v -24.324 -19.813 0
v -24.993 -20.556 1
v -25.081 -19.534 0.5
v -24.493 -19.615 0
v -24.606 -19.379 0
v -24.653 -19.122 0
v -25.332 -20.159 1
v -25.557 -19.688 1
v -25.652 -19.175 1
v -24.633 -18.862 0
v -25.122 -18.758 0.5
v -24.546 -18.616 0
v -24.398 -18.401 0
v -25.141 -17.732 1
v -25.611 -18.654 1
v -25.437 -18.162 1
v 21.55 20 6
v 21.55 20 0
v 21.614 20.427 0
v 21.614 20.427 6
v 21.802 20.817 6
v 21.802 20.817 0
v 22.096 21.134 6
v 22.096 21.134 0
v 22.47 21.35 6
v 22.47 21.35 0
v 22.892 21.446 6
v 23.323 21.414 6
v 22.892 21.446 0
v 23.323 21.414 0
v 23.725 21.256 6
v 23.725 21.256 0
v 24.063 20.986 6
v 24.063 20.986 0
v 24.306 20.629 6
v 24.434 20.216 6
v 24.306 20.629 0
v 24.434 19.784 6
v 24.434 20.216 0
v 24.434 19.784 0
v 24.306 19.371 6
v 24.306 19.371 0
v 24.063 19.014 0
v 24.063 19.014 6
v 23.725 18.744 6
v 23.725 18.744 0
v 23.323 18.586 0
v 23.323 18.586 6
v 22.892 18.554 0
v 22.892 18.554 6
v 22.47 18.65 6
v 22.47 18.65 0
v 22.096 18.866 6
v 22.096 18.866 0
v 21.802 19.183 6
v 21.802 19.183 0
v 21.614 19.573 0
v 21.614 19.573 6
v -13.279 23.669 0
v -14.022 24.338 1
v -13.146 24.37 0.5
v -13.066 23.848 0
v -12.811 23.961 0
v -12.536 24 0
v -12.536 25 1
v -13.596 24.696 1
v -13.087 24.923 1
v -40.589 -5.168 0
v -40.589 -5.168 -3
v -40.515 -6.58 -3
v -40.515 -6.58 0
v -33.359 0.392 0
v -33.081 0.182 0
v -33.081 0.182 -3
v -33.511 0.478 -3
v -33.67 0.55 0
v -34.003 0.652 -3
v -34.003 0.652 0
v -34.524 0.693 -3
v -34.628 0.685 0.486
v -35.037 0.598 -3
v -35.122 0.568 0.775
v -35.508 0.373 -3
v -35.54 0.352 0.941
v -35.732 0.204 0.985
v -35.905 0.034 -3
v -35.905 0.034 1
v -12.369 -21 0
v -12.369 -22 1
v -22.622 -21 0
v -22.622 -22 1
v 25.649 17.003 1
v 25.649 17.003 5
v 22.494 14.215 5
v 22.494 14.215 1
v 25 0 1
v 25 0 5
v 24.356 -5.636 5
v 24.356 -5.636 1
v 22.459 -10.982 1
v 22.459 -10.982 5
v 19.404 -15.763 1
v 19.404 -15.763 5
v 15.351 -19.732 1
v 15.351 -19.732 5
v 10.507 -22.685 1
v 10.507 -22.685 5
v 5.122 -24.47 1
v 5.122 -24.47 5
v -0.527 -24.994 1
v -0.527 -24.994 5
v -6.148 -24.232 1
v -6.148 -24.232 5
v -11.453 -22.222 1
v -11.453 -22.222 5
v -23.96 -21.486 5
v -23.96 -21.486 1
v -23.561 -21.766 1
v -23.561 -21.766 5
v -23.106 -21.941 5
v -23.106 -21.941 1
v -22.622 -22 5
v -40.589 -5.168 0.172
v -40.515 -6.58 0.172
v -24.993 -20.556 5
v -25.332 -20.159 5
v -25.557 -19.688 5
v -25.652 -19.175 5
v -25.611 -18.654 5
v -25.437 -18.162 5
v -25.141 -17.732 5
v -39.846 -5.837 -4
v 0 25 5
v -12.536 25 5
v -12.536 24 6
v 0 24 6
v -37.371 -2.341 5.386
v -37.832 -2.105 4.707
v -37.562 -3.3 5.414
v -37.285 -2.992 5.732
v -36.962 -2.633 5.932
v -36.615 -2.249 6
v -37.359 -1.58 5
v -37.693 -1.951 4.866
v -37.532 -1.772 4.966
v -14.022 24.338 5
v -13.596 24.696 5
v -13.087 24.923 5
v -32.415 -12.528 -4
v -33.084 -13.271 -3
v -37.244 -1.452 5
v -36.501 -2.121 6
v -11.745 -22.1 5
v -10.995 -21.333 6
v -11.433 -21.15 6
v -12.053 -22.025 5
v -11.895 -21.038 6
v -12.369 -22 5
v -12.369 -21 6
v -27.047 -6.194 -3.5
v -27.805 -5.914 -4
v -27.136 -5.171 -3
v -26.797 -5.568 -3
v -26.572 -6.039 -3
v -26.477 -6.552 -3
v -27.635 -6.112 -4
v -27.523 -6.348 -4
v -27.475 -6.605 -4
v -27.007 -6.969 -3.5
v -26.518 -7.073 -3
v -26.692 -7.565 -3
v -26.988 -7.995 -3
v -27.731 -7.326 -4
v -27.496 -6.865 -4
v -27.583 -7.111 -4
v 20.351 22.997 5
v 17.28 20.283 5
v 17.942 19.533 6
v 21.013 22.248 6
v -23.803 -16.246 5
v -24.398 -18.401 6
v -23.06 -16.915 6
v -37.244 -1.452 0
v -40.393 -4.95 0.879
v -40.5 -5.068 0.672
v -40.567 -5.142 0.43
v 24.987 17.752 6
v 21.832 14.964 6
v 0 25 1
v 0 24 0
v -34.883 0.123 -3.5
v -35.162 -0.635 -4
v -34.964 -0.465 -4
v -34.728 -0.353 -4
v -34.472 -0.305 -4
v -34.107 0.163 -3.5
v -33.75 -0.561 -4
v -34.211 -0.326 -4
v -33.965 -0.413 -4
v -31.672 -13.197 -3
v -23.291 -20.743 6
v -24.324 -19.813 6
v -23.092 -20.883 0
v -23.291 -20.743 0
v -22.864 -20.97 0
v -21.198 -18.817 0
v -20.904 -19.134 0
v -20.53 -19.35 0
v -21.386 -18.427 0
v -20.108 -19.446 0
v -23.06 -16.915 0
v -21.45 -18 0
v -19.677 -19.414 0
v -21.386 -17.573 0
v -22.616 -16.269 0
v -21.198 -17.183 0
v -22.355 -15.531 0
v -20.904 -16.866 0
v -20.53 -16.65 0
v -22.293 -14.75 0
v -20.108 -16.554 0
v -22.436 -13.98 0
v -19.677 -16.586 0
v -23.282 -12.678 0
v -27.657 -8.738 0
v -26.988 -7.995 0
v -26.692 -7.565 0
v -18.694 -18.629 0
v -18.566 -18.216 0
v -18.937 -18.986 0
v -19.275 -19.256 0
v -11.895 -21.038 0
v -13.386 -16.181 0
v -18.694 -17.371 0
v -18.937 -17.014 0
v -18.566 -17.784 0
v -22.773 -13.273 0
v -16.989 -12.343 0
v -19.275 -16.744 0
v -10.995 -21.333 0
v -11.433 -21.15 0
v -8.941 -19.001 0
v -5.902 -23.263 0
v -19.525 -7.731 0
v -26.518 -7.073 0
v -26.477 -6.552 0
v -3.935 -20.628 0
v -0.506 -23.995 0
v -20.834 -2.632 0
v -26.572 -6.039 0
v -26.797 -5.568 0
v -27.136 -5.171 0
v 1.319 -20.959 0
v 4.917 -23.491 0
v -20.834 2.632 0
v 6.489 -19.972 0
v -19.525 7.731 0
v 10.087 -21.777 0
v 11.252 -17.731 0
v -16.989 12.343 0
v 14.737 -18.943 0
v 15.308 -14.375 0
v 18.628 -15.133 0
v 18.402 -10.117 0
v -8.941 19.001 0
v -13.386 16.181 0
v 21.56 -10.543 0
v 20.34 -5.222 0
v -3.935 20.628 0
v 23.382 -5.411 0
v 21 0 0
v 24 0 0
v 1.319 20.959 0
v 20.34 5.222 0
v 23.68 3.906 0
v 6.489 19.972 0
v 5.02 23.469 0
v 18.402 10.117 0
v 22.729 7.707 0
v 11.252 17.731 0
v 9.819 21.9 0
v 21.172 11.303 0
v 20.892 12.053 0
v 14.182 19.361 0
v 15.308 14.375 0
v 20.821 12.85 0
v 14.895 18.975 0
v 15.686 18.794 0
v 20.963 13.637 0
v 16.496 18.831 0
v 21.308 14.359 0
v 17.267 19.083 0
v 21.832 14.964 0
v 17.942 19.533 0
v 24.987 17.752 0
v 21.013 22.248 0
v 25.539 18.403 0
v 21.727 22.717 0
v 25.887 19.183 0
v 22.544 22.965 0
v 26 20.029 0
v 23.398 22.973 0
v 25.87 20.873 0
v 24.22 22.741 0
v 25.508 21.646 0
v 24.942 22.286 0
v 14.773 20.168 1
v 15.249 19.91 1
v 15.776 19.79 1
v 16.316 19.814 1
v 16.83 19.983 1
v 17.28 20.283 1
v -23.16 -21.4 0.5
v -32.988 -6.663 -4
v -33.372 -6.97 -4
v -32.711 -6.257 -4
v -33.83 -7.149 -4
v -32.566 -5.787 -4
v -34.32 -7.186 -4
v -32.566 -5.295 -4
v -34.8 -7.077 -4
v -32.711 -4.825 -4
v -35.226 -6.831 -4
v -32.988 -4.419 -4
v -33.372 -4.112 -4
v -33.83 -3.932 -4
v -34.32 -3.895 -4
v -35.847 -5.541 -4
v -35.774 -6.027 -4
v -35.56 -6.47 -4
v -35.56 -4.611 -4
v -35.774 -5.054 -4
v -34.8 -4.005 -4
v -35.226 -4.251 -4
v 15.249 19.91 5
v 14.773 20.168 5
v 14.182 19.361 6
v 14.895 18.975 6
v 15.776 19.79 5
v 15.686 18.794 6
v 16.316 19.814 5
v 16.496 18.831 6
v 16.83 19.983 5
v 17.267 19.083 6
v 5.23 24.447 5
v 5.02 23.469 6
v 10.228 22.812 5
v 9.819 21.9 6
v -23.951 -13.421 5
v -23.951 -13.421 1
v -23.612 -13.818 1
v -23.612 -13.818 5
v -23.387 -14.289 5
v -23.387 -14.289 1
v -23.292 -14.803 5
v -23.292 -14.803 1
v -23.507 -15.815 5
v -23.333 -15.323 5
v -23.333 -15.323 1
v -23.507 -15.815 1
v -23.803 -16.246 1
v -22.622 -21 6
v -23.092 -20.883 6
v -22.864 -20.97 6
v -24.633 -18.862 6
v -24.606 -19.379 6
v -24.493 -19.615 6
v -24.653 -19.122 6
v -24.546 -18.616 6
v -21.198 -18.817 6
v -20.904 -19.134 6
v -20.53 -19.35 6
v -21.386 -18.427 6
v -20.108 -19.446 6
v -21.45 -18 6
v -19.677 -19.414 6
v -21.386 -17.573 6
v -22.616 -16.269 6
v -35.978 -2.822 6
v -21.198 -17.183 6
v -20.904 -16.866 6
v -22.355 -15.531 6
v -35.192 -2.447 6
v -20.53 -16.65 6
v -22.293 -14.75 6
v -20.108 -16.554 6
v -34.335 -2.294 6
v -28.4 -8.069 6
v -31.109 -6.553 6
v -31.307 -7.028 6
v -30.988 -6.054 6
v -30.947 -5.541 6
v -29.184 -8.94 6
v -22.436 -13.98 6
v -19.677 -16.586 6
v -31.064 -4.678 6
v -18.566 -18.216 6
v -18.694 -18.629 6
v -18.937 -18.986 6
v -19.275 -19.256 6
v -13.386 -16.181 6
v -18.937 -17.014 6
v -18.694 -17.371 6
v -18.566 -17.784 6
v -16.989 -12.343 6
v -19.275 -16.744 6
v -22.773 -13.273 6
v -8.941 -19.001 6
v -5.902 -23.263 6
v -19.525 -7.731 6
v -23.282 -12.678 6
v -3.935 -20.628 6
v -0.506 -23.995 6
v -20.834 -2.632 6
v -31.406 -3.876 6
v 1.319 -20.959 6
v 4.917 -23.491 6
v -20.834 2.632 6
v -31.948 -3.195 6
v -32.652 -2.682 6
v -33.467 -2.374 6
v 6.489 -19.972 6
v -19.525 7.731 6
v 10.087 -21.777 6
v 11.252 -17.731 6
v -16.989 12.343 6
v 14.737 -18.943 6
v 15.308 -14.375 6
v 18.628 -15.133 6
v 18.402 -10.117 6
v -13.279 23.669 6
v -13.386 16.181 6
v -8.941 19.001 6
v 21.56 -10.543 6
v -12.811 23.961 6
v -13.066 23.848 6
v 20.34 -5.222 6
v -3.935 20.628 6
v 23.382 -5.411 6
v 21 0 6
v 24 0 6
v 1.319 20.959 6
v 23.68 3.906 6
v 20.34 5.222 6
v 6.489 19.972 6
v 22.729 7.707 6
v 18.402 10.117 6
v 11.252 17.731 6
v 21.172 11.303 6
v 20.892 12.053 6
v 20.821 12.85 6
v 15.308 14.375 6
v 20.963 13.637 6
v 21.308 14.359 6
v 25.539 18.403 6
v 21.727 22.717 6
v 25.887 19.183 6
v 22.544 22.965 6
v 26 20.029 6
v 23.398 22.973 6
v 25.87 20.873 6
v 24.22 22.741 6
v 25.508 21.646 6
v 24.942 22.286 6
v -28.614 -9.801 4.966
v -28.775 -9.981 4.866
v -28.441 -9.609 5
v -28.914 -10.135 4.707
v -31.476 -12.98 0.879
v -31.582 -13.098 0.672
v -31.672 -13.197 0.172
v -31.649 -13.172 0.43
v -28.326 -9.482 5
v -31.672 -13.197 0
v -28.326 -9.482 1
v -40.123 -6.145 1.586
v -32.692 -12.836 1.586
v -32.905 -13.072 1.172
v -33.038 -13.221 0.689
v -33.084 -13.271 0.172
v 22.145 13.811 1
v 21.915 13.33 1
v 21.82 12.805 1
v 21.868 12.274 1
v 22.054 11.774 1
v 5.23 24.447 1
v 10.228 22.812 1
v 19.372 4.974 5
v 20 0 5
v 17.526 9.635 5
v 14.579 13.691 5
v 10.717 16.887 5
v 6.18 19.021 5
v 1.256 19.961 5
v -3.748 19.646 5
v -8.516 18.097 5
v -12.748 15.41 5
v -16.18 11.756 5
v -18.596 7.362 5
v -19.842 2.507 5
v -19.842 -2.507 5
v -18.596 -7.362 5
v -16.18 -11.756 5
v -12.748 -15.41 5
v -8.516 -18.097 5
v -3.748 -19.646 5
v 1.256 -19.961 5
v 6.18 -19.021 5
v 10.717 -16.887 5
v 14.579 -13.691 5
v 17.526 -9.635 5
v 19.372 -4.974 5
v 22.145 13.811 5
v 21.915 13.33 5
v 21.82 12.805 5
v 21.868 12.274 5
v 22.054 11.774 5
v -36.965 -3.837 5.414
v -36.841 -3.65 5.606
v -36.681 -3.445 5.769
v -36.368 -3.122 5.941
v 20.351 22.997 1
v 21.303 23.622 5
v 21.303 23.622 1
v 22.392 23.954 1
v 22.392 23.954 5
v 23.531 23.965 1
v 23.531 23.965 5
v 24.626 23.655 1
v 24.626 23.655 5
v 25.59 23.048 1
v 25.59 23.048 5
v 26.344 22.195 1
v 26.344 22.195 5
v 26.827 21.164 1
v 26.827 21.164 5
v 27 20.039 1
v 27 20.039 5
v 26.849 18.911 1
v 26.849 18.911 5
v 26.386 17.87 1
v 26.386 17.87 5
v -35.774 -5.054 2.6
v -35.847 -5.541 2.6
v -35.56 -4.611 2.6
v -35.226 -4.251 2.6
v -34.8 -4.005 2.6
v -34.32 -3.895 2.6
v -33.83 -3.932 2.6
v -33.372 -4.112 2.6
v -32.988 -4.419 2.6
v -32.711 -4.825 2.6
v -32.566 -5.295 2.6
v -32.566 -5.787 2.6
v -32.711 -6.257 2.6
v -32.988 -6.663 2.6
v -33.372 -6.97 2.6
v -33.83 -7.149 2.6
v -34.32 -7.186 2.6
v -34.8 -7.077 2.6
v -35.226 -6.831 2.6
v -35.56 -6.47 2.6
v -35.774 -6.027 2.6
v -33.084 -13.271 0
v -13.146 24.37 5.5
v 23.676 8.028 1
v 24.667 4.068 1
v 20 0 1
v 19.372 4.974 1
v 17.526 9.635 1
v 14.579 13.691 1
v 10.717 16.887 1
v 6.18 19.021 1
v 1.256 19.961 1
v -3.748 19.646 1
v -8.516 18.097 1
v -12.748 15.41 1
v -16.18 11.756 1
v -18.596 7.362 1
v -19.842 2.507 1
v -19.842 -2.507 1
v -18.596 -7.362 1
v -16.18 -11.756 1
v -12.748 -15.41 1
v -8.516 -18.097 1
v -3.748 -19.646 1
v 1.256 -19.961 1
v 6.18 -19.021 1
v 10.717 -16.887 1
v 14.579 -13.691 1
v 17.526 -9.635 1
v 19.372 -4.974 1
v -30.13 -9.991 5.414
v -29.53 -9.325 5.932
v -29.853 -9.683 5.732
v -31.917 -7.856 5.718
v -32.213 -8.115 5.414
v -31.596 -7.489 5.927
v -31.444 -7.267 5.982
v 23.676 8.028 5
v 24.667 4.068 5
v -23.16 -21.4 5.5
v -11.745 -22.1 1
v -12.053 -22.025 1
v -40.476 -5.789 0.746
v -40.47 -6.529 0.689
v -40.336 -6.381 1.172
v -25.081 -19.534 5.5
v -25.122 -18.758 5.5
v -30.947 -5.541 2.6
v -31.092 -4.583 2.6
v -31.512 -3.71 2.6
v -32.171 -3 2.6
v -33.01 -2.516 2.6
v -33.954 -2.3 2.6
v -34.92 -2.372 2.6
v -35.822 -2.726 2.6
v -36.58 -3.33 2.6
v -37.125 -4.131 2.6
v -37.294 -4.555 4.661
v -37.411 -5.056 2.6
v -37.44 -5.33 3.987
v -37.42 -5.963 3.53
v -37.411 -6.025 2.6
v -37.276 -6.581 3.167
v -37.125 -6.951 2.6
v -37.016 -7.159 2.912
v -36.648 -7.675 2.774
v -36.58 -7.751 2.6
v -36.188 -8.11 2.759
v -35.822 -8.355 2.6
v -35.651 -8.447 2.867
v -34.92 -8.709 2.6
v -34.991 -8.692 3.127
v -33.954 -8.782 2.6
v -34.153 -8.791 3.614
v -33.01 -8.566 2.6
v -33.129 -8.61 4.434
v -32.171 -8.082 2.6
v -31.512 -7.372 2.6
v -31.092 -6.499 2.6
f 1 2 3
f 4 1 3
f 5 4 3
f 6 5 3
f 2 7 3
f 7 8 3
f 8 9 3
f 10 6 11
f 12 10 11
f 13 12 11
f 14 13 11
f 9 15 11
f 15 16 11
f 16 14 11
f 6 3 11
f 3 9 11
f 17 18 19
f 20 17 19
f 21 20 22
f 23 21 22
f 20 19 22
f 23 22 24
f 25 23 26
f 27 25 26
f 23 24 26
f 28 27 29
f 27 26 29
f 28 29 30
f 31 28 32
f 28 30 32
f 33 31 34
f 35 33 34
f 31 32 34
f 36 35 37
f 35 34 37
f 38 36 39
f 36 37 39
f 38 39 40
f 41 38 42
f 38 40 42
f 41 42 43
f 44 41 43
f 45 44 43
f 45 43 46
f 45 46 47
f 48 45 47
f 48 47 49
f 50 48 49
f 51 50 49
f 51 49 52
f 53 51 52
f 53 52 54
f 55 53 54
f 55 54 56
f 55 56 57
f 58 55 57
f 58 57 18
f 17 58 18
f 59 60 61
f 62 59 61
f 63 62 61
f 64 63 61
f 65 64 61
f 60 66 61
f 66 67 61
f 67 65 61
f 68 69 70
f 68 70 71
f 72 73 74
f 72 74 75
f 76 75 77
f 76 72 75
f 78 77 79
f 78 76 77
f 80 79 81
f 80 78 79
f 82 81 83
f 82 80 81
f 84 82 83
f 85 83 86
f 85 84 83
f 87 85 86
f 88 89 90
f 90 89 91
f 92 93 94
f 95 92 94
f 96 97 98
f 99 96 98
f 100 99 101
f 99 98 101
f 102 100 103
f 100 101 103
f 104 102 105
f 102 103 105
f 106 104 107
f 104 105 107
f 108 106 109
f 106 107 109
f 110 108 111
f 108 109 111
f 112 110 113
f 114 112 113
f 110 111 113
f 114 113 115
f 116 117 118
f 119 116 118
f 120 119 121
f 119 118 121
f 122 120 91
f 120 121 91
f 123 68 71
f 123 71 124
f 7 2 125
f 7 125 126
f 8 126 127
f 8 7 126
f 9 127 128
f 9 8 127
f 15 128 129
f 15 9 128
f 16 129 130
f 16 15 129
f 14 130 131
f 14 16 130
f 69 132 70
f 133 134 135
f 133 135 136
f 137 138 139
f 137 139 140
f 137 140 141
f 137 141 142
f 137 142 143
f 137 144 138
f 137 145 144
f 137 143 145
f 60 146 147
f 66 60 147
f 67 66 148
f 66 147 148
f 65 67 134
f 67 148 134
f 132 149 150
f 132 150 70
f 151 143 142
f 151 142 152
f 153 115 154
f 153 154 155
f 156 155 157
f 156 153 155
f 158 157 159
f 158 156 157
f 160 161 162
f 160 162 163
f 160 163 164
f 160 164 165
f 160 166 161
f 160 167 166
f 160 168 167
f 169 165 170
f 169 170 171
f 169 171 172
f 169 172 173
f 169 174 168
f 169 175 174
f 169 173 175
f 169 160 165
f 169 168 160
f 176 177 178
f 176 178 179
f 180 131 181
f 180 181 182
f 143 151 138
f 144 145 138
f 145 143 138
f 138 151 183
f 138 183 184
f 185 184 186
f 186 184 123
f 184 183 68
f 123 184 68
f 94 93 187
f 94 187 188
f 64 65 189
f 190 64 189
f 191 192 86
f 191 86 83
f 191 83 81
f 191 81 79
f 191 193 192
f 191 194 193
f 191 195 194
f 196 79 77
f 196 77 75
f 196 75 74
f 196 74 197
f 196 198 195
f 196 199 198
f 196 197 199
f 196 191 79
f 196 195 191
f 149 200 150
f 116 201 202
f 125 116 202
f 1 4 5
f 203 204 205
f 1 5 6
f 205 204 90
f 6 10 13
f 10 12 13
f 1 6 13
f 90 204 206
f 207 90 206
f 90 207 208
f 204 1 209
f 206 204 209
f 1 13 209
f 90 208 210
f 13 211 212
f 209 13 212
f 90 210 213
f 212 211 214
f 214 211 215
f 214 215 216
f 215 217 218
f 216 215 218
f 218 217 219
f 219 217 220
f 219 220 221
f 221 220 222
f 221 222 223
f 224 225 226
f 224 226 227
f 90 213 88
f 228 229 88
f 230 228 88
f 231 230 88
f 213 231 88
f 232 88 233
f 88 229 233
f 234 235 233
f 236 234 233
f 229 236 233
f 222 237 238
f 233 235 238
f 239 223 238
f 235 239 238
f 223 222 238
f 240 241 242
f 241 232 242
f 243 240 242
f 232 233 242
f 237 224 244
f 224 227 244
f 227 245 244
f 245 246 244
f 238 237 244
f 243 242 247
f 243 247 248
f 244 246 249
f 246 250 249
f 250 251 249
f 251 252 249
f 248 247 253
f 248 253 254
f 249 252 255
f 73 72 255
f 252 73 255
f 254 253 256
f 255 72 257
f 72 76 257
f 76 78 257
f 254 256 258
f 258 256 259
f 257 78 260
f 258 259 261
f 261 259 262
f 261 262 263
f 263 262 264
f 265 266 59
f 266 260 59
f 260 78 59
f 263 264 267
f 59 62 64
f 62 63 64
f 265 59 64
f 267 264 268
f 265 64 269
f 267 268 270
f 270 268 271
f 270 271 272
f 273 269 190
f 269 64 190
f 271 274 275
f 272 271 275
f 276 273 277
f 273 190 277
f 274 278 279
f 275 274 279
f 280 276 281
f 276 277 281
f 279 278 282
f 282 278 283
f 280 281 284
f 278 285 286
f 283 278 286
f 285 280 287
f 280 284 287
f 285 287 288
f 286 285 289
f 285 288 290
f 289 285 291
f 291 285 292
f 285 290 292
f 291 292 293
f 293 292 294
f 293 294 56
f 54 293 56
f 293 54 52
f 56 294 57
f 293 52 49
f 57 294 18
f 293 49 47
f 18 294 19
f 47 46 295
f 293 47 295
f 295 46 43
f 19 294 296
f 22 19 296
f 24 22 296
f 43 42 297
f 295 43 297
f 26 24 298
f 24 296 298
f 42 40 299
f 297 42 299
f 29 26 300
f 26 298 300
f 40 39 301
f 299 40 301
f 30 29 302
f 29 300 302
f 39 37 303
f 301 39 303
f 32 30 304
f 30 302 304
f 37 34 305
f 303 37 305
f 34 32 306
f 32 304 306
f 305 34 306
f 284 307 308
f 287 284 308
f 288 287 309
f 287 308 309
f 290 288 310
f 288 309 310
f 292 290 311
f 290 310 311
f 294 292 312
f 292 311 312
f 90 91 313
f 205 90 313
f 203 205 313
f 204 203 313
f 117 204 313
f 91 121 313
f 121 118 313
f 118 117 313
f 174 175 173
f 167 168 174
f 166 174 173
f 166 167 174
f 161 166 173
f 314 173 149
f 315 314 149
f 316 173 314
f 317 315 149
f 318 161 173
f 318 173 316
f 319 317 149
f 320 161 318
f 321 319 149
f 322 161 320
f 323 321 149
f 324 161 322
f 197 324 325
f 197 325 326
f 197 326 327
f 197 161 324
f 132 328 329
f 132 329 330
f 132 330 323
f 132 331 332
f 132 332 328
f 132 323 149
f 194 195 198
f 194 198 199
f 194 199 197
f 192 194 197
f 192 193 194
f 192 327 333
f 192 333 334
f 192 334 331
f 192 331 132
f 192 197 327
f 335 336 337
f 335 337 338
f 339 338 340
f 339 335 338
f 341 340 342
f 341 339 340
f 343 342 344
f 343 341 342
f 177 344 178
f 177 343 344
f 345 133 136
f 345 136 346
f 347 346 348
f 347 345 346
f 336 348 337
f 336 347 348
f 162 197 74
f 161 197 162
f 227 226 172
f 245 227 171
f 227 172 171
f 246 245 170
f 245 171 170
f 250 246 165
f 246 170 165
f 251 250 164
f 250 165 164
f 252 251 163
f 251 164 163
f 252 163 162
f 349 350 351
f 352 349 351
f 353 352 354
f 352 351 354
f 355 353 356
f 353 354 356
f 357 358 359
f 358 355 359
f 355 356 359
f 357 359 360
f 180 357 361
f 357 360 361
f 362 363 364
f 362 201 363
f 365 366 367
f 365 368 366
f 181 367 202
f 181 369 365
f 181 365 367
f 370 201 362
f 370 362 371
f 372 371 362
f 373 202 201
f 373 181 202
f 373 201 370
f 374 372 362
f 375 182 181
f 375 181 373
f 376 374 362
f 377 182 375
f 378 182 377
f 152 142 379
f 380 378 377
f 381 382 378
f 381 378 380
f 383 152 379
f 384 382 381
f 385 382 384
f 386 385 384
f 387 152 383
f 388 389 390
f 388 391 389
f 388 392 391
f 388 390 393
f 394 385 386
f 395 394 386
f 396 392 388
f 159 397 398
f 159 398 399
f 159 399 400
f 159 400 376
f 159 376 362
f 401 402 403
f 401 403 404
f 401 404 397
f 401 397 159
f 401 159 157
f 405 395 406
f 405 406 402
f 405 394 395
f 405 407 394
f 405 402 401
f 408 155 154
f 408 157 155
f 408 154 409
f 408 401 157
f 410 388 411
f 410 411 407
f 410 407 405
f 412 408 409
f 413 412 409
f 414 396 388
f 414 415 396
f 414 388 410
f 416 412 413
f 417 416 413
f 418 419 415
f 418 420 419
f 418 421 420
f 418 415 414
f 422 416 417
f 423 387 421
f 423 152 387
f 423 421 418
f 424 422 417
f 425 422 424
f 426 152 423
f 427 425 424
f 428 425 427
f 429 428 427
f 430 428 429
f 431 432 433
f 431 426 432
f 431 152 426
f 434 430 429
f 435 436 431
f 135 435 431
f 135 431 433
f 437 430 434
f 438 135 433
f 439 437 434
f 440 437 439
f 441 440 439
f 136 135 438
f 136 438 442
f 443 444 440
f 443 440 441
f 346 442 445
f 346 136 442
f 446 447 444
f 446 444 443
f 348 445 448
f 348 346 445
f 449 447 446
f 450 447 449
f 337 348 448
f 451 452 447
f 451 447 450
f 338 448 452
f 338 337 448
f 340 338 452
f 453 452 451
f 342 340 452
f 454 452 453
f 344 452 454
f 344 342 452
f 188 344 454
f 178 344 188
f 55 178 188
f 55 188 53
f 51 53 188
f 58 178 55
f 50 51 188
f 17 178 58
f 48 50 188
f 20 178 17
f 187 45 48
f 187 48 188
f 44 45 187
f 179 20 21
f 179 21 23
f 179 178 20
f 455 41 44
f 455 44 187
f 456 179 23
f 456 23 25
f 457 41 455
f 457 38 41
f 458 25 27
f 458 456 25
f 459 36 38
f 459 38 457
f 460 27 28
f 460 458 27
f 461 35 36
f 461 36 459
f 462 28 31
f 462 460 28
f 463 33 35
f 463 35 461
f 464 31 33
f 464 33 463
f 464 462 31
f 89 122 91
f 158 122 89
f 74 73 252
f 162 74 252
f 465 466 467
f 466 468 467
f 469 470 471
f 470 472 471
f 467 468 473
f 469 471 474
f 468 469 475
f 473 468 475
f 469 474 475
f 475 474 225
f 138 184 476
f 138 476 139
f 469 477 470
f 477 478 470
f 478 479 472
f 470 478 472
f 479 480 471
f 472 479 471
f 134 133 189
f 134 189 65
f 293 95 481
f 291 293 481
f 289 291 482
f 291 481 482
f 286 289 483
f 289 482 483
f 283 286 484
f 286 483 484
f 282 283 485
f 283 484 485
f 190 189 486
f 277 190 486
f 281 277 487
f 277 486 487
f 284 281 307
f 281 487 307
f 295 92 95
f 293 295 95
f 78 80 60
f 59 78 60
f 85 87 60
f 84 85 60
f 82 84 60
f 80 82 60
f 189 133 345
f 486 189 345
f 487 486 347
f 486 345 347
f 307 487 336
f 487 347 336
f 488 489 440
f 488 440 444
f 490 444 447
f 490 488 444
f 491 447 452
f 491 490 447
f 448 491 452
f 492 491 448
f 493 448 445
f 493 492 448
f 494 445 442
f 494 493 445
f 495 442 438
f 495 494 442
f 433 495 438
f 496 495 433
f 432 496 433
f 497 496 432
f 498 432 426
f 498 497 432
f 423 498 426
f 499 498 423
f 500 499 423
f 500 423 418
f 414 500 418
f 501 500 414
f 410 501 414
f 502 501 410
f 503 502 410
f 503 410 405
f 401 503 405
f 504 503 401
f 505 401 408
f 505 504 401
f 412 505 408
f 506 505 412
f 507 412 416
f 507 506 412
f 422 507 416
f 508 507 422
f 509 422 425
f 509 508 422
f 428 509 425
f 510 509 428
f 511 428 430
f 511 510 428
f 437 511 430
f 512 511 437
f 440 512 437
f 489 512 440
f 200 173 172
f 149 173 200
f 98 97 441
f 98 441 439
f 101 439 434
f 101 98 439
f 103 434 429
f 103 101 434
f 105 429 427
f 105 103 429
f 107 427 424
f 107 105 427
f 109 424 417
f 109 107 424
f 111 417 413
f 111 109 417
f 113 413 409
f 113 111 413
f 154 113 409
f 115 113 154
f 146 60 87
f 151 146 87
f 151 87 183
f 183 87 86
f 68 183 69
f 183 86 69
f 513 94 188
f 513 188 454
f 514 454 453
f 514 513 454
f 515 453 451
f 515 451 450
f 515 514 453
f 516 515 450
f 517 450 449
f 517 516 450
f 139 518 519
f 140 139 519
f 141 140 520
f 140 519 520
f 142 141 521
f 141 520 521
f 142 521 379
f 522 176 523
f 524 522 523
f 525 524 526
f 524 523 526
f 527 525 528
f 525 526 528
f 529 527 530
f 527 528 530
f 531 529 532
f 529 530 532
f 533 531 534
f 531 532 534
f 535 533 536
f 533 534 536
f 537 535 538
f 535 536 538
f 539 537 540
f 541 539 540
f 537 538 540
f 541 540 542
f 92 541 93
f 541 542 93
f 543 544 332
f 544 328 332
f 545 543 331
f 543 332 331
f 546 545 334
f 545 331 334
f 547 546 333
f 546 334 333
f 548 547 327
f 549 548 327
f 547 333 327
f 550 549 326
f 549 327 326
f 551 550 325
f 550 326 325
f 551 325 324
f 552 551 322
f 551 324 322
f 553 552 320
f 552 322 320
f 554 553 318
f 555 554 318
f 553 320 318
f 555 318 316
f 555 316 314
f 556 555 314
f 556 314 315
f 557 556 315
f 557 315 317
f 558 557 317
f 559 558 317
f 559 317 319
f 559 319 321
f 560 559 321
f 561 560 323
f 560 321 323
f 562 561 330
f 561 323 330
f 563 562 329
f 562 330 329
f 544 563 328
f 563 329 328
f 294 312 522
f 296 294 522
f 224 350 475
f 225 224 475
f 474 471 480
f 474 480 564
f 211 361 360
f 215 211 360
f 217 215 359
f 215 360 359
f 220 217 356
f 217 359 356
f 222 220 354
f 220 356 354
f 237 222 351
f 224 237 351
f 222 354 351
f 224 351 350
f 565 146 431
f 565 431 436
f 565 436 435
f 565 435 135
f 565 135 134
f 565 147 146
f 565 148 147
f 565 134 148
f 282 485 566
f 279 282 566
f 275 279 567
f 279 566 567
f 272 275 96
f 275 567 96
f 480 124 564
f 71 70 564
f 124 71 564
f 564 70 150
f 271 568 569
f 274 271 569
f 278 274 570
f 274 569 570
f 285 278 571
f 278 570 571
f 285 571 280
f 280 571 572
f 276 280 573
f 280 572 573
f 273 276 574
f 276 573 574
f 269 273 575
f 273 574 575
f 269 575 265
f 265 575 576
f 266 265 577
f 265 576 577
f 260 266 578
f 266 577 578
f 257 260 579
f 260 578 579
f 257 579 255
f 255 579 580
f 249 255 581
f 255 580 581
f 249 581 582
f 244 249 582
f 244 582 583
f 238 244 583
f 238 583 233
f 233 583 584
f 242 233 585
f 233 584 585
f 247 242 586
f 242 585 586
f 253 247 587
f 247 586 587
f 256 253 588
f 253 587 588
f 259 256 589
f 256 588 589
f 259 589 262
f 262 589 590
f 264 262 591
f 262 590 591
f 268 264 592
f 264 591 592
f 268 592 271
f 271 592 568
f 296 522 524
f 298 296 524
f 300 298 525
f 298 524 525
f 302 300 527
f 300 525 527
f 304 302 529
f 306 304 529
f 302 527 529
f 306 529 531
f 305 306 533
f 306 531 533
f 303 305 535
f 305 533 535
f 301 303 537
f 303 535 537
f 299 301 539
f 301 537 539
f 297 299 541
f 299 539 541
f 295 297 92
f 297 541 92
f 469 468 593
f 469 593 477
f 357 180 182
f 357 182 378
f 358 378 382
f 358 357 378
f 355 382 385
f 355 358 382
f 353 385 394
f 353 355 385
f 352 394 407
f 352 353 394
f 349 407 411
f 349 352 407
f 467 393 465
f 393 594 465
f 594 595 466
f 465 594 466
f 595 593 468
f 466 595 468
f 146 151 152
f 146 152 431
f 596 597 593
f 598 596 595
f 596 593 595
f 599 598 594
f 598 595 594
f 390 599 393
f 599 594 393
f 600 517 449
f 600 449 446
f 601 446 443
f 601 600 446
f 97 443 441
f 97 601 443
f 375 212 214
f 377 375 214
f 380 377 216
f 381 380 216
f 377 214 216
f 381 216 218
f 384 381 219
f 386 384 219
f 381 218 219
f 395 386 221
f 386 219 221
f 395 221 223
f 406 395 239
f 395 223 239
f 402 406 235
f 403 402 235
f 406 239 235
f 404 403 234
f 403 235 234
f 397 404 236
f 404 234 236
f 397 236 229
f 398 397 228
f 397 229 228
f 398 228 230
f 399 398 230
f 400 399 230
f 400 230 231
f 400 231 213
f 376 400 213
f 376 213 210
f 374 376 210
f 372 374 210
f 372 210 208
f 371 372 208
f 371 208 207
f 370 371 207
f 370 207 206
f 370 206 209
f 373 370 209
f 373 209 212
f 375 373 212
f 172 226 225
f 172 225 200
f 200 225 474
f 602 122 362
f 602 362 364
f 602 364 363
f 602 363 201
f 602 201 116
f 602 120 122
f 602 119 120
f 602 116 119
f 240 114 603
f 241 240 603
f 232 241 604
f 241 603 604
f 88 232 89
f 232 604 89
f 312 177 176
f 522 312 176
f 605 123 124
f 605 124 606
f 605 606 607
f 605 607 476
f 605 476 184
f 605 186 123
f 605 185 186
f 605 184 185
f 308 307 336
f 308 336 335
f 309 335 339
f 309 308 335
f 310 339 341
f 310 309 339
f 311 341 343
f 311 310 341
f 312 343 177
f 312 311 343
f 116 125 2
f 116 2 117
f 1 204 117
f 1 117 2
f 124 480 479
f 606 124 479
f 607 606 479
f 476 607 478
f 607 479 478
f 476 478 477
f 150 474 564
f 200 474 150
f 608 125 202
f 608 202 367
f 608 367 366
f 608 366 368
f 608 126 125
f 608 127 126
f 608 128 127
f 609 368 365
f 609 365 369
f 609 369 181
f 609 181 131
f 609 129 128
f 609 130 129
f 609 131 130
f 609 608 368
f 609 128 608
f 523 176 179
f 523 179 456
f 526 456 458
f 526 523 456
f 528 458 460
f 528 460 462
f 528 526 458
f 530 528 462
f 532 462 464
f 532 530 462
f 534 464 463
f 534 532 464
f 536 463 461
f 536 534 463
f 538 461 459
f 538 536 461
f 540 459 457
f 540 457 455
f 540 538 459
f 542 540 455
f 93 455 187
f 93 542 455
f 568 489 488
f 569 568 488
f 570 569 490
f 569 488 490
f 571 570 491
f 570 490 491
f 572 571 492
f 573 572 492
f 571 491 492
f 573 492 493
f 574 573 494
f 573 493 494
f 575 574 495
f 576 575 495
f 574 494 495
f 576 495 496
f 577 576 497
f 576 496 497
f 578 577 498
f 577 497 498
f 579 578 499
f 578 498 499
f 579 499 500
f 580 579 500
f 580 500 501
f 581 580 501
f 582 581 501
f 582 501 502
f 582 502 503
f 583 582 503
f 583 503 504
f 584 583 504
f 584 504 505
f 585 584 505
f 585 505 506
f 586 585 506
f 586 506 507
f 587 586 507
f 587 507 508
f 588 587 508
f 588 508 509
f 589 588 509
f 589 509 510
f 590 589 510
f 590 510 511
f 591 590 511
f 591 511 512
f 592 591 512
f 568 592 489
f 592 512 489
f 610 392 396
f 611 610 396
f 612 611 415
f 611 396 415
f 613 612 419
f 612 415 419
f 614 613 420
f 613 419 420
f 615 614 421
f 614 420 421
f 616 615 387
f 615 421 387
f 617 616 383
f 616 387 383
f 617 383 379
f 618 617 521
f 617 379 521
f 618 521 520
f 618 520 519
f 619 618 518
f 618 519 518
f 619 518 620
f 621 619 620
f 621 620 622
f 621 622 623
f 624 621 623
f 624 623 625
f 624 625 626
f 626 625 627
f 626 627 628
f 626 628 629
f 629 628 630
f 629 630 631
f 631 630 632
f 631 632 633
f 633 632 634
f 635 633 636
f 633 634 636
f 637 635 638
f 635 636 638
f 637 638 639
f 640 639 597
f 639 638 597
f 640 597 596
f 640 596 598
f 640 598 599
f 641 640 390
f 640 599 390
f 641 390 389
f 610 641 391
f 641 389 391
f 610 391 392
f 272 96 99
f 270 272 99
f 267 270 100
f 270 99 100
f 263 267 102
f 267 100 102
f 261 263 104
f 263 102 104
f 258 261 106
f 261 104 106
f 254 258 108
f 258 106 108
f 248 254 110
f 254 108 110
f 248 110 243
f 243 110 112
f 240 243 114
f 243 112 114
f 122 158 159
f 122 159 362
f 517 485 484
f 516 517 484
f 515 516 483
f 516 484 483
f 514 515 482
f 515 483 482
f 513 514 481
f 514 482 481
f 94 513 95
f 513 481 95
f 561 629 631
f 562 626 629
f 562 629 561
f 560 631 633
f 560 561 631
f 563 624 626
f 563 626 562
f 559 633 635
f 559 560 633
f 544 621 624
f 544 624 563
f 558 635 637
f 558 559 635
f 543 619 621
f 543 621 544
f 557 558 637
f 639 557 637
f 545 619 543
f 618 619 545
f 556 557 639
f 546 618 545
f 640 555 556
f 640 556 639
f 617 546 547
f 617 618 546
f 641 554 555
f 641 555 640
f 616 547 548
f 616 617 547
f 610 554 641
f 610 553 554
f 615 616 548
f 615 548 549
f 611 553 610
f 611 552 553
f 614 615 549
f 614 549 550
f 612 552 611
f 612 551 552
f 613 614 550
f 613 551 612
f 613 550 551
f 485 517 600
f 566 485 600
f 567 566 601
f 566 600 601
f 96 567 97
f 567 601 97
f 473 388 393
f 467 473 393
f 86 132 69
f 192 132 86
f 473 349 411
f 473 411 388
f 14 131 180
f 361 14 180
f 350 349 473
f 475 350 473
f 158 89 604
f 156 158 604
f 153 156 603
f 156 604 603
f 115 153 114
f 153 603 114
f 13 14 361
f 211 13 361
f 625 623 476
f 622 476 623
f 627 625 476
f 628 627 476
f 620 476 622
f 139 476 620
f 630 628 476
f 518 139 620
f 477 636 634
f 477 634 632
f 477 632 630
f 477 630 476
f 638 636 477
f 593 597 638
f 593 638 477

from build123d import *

# Parameters (mm, degrees)
SKETCH_1_W                   = 60
SKETCH_1_H                   = 55
EXTRUDE_1_DEPTH              = 6
HOLE_WIZARD_M4_1_D           = 2.9
HOLE_WIZARD_M4_1_DEPTH       = 10
SKETCH_5_R                   = 20
CUT_EXTRUDE_1_DEPTH          = 7
SKETCH_6_W                   = 60
SKETCH_6_H                   = 55
CUT_EXTRUDE_2_DEPTH          = 7
EXTRUDE_2_DEPTH              = 6
EXTRUDE_3_DEPTH              = 6
EXTRUDE_4_DEPTH              = 4
CUT_EXTRUDE_3_DEPTH          = 11
CUT_EXTRUDE_4_DEPTH          = 6
FILLET_1_R                   = 2
EXTRUDE_5_DEPTH              = 6
CHAMFER_2_SIZE               = 5
FILLET_4_R                   = 2
CHAMFER_3_SIZE               = 1
HOLE_WIZARD_M3_2_D           = 3.3
HOLE_WIZARD_M3_2_DEPTH       = 10
HOLE_WIZARD_M3_2_CBORE_D     = 6.5
HOLE_WIZARD_M3_2_CBORE_DEPTH = 3.4
HOLE_WIZARD_M3_2_TIP         = 0.991420021


with BuildPart() as part:
    # ｽｹｯﾁ1 → ﾎﾞｽ - 押し出し1 (new body)
    with BuildSketch(Plane.XY):
        Rectangle(SKETCH_1_W, SKETCH_1_H)
    extrude(amount=EXTRUDE_1_DEPTH)

    # M4 すきま穴1
    with Locations(Plane.XY.offset(6)):
        with Locations((-20, -18), (23, 20)):
            Hole(HOLE_WIZARD_M4_1_D / 2, depth=HOLE_WIZARD_M4_1_DEPTH)

    # ｽｹｯﾁ5 → ｶｯﾄ - 押し出し1 (cut, through all)
    with BuildSketch(Plane.XY.offset(6)):
        Circle(SKETCH_5_R)
    extrude(amount=-CUT_EXTRUDE_1_DEPTH, mode=Mode.SUBTRACT)

    # ｽｹｯﾁ6 → ｶｯﾄ - 押し出し2 (cut, through all)
    with BuildSketch(Plane.XY.offset(6)):
        Rectangle(SKETCH_6_W, SKETCH_6_H)
        with BuildLine():
            ThreePointArc((-17.351208814, -20.997316342), (-22.997316342, -20.648791186), (-22.648791186, -15.002683658))
            Line((-22.648791186, -15.002683658), (-21.007829355, -13.552531342))
            ThreePointArc((-21.007829355, -13.552531342), (-16.554944912, 18.733227137), (16.03335661, 19.181539975))
            Line((16.03335661, 19.181539975), (20.351208814, 22.997316342))
            ThreePointArc((20.351208814, 22.997316342), (25.997316342, 22.648791186), (25.648791186, 17.002683658))
            Line((25.648791186, 17.002683658), (21.271672672, 13.134532414))
            ThreePointArc((21.271672672, 13.134532414), (24.04986296, 6.826718948), (25, 0))
            ThreePointArc((25, 0), (10.810307191, -22.541900062), (-15.650980674, -19.494789148))
            Line((-15.650980674, -19.494789148), (-17.351208814, -20.997316342))
        make_face(mode=Mode.SUBTRACT)
    extrude(amount=-CUT_EXTRUDE_2_DEPTH, mode=Mode.SUBTRACT)

    # ｽｹｯﾁ7 → ﾎﾞｽ - 押し出し2 (add)
    with BuildSketch(Plane.XY.offset(6)):
        with BuildLine():
            Line((0, 25), (-21.5, 25))
            Line((-21.5, 25), (-21.5, 12.757350822))
            ThreePointArc((-21.5, 12.757350822), (-12.370655388, 21.724798855), (0, 25))
        make_face()
        with BuildLine():
            ThreePointArc((-17.351208814, -20.997316342), (-18.583890076, -21.74094008), (-20, -22))
            Line((-20, -22), (-11.874342087, -22))
            ThreePointArc((-11.874342087, -22), (-13.819546614, -20.833149819), (-15.650980674, -19.494789148))
            Line((-15.650980674, -19.494789148), (-17.351208814, -20.997316342))
        make_face()
        with BuildLine():
            ThreePointArc((-21.007829355, -13.552531342), (-21.25763315, -13.157242601), (-21.5, -12.757350822))
            Line((-21.5, -12.757350822), (-21.5, -13.987472843))
            Line((-21.5, -13.987472843), (-21.007829355, -13.552531342))
        make_face()
    extrude(amount=-EXTRUDE_2_DEPTH)

    # ｽｹｯﾁ8 → ﾎﾞｽ - 押し出し3 (add)
    with BuildSketch(Plane.XY.offset(6)):
        with BuildLine():
            Line((-21.5, 12.757350822), (-21.5, 25))
            Line((-21.5, 25), (-45.717384076, -1.896129831))
            Line((-45.717384076, -1.896129831), (-23.389774269, -22))
            Line((-23.389774269, -22), (-20, -22))
            ThreePointArc((-20, -22), (-23.74094008, -19.416109924), (-22.648791186, -15.002683658))
            Line((-22.648791186, -15.002683658), (-21.5, -13.987472843))
            Line((-21.5, -13.987472843), (-21.5, -12.757350822))
            ThreePointArc((-21.5, -12.757350822), (-25, 0), (-21.5, 12.757350822))
        make_face()
    extrude(amount=-EXTRUDE_3_DEPTH)

    # ｽｹｯﾁ9 → ﾎﾞｽ - 押し出し4 (add)
    with BuildSketch(Plane(origin=(0, 0, 0), x_dir=(-1, 0, 0), z_dir=(0, 0, -1))):
        Polygon((25.649471154, -6.509032491), (32.340777217, -13.940480745), (45.717384076, -1.896129831), (39.026078012, 5.535318424), align=None)
    extrude(amount=EXTRUDE_4_DEPTH)

    # ｽｹｯﾁ10 → ｶｯﾄ - 押し出し3 (cut, through all)
    with BuildSketch(Plane(origin=(0, 0, -4), x_dir=(-1, 0, 0), z_dir=(0, 0, -1))):
        Polygon((39.026078012, 5.535318424), (21.5, 25), (13.426203622, 25), (41.258515123, -5.910913469), (45.717384076, -1.896129831), align=None)
    extrude(amount=-CUT_EXTRUDE_3_DEPTH, mode=Mode.SUBTRACT)

    # ｽｹｯﾁ12 → ｶｯﾄ - 押し出し4 (cut)
    with BuildSketch(Plane.XY.offset(6)):
        Polygon((-41.258515123, -5.910913469), (-26.47934628, -19.218136867), (-22.464562642, -14.759267914), (-37.243731485, -1.452044516), align=None)
    extrude(amount=-CUT_EXTRUDE_4_DEPTH, mode=Mode.SUBTRACT)

    # ﾌｨﾚｯﾄ1
    fillet_1_edges = [part.edges().sort_by_distance(p)[0] for p in [
        (-25.649471154, -6.509032491, -2),
        (-34.567209059, 1.520534786, -2),
        (-26.47934628, -19.218136867, 3),
    ]]
    fillet(fillet_1_edges, radius=FILLET_1_R)

    # ｽｹｯﾁ13 → ﾎﾞｽ - 押し出し5 (add)
    with BuildSketch(Plane.XY):
        Polygon((-32.340777217, -13.940480745), (-28.325993579, -9.481611793), (-37.243731485, -1.452044516), (-41.258515123, -5.910913469), align=None)
    extrude(amount=EXTRUDE_5_DEPTH)

    # 面取り2
    chamfer_2_edges = [part.edges().sort_by_distance(p)[0] for p in [
        (-36.79964617, -9.925697107, 6),
    ]]
    chamfer(chamfer_2_edges, length=CHAMFER_2_SIZE)

    # ﾌｨﾚｯﾄ4
    fillet_4_edges = [part.edges().sort_by_distance(p)[0] for p in [
        (-23.389774269, -22, 3),
        (-13.426203622, 25, 3),
        (-22.464562642, -14.759267914, 3),
        (-33.453993138, -6.20997298, 6),
        (-36.79964617, -9.925697107, 1),
        (21.271672672, 13.134532414, 3),
        (16.03335661, 19.181539975, 3),
        (-11.874342087, -22, 3),
    ]]
    fillet(fillet_4_edges, radius=FILLET_4_R)

    # 面取り3
    chamfer_3_edges = [part.edges().sort_by_distance(p)[0] for p in [
        (-29.664254792, -10.967901443, -4),
        (-32.340777217, -13.940480745, -1.914213562),
        (-36.79964617, -9.925697107, -4),
        (-38.581992697, -2.938334167, -4),
        (-30.108340106, -2.494248852, -4),
        (-34.523852534, 0.693242992, -4),
        (-26.476762948, -6.552389016, -4),
        (-24.471954461, -16.98870239, 6),
        (-24.471954461, -16.98870239, 0),
        (-24.47668202, -21.021343865, 6),
        (-25.652054486, -19.174780341, 6),
        (-25.652054486, -19.174780341, 0),
        (-24.47668202, -21.021343865, 0),
        (-25.690286025, 11.379356601, 6),
        (-28.38339591, -9.54536354, 6),
        (-26.138422936, -11.451309247, 6),
        (-17.495681538, -22, 6),
        (17.805324329, -17.549086174, 6),
        (24.071292776, 15.608615296, 6),
        (18.815379015, 21.640071403, 6),
        (7.771710455, 23.761323966, 6),
        (-13.349219538, 24.827090915, 6),
        (-23.338782098, -21.867160853, 6),
        (-17.495681538, -22, 0),
        (-26.138422936, -11.451309247, 0),
        (-24.963753087, 12.186253174, 0),
        (-6.267873126, 25, 0),
        (7.771710455, 23.761323966, 0),
        (18.815379015, 21.640071403, 0),
        (24.071292776, 15.608615296, 0),
        (17.805324329, -17.549086174, 0),
        (-13.349219538, 24.827090915, 0),
        (-23.338782098, -21.867160853, 0),
        (-41.258515123, -5.910913469, -1.914213562),
        (-39.585688607, -4.053051405, 3.5),
        (-37.870666541, -2.148326436, 5.847759065),
        (-41.156646054, -5.797776406, 0.93693974),
        (-30.667950701, -12.082618682, 3.5),
        (-28.952928635, -10.177893712, 5.847759065),
        (-32.238908148, -13.827343682, 0.93693974),
        (21.8499093, 13.07067214, 0),
        (21.8499093, 13.07067214, 6),
        (16.046656493, 19.783578925, 0),
        (16.046656493, 19.783578925, 6),
        (-11.897912356, -22.056349368, 6),
        (-11.897912356, -22.056349368, 0),
        (-23.291854436, -14.80262444, 6),
        (-23.291854436, -14.80262444, 0),
        (-20, 0, 0),
        (-20, 0, 6),
        (25.997316342, 22.648791186, 0),
        (25.997316342, 22.648791186, 6),
        (-6.267873126, 25, 6),
    ]]
    chamfer(chamfer_3_edges, length=CHAMFER_3_SIZE)

    # M3 六角穴付き頭ねじ用座ぐり穴2
    with Locations(Plane.XY.offset(6)):
        with Locations((-34.197137964, -5.540842373)):
            CounterBoreHole(HOLE_WIZARD_M3_2_D / 2, HOLE_WIZARD_M3_2_CBORE_D / 2, HOLE_WIZARD_M3_2_CBORE_DEPTH, depth=HOLE_WIZARD_M3_2_DEPTH)
            with Locations((0, 0, -(HOLE_WIZARD_M3_2_DEPTH + HOLE_WIZARD_M3_2_TIP / 2))):  # 118° drill point
                Cone(0, HOLE_WIZARD_M3_2_D / 2, HOLE_WIZARD_M3_2_TIP, mode=Mode.SUBTRACT)


solid = part.part
